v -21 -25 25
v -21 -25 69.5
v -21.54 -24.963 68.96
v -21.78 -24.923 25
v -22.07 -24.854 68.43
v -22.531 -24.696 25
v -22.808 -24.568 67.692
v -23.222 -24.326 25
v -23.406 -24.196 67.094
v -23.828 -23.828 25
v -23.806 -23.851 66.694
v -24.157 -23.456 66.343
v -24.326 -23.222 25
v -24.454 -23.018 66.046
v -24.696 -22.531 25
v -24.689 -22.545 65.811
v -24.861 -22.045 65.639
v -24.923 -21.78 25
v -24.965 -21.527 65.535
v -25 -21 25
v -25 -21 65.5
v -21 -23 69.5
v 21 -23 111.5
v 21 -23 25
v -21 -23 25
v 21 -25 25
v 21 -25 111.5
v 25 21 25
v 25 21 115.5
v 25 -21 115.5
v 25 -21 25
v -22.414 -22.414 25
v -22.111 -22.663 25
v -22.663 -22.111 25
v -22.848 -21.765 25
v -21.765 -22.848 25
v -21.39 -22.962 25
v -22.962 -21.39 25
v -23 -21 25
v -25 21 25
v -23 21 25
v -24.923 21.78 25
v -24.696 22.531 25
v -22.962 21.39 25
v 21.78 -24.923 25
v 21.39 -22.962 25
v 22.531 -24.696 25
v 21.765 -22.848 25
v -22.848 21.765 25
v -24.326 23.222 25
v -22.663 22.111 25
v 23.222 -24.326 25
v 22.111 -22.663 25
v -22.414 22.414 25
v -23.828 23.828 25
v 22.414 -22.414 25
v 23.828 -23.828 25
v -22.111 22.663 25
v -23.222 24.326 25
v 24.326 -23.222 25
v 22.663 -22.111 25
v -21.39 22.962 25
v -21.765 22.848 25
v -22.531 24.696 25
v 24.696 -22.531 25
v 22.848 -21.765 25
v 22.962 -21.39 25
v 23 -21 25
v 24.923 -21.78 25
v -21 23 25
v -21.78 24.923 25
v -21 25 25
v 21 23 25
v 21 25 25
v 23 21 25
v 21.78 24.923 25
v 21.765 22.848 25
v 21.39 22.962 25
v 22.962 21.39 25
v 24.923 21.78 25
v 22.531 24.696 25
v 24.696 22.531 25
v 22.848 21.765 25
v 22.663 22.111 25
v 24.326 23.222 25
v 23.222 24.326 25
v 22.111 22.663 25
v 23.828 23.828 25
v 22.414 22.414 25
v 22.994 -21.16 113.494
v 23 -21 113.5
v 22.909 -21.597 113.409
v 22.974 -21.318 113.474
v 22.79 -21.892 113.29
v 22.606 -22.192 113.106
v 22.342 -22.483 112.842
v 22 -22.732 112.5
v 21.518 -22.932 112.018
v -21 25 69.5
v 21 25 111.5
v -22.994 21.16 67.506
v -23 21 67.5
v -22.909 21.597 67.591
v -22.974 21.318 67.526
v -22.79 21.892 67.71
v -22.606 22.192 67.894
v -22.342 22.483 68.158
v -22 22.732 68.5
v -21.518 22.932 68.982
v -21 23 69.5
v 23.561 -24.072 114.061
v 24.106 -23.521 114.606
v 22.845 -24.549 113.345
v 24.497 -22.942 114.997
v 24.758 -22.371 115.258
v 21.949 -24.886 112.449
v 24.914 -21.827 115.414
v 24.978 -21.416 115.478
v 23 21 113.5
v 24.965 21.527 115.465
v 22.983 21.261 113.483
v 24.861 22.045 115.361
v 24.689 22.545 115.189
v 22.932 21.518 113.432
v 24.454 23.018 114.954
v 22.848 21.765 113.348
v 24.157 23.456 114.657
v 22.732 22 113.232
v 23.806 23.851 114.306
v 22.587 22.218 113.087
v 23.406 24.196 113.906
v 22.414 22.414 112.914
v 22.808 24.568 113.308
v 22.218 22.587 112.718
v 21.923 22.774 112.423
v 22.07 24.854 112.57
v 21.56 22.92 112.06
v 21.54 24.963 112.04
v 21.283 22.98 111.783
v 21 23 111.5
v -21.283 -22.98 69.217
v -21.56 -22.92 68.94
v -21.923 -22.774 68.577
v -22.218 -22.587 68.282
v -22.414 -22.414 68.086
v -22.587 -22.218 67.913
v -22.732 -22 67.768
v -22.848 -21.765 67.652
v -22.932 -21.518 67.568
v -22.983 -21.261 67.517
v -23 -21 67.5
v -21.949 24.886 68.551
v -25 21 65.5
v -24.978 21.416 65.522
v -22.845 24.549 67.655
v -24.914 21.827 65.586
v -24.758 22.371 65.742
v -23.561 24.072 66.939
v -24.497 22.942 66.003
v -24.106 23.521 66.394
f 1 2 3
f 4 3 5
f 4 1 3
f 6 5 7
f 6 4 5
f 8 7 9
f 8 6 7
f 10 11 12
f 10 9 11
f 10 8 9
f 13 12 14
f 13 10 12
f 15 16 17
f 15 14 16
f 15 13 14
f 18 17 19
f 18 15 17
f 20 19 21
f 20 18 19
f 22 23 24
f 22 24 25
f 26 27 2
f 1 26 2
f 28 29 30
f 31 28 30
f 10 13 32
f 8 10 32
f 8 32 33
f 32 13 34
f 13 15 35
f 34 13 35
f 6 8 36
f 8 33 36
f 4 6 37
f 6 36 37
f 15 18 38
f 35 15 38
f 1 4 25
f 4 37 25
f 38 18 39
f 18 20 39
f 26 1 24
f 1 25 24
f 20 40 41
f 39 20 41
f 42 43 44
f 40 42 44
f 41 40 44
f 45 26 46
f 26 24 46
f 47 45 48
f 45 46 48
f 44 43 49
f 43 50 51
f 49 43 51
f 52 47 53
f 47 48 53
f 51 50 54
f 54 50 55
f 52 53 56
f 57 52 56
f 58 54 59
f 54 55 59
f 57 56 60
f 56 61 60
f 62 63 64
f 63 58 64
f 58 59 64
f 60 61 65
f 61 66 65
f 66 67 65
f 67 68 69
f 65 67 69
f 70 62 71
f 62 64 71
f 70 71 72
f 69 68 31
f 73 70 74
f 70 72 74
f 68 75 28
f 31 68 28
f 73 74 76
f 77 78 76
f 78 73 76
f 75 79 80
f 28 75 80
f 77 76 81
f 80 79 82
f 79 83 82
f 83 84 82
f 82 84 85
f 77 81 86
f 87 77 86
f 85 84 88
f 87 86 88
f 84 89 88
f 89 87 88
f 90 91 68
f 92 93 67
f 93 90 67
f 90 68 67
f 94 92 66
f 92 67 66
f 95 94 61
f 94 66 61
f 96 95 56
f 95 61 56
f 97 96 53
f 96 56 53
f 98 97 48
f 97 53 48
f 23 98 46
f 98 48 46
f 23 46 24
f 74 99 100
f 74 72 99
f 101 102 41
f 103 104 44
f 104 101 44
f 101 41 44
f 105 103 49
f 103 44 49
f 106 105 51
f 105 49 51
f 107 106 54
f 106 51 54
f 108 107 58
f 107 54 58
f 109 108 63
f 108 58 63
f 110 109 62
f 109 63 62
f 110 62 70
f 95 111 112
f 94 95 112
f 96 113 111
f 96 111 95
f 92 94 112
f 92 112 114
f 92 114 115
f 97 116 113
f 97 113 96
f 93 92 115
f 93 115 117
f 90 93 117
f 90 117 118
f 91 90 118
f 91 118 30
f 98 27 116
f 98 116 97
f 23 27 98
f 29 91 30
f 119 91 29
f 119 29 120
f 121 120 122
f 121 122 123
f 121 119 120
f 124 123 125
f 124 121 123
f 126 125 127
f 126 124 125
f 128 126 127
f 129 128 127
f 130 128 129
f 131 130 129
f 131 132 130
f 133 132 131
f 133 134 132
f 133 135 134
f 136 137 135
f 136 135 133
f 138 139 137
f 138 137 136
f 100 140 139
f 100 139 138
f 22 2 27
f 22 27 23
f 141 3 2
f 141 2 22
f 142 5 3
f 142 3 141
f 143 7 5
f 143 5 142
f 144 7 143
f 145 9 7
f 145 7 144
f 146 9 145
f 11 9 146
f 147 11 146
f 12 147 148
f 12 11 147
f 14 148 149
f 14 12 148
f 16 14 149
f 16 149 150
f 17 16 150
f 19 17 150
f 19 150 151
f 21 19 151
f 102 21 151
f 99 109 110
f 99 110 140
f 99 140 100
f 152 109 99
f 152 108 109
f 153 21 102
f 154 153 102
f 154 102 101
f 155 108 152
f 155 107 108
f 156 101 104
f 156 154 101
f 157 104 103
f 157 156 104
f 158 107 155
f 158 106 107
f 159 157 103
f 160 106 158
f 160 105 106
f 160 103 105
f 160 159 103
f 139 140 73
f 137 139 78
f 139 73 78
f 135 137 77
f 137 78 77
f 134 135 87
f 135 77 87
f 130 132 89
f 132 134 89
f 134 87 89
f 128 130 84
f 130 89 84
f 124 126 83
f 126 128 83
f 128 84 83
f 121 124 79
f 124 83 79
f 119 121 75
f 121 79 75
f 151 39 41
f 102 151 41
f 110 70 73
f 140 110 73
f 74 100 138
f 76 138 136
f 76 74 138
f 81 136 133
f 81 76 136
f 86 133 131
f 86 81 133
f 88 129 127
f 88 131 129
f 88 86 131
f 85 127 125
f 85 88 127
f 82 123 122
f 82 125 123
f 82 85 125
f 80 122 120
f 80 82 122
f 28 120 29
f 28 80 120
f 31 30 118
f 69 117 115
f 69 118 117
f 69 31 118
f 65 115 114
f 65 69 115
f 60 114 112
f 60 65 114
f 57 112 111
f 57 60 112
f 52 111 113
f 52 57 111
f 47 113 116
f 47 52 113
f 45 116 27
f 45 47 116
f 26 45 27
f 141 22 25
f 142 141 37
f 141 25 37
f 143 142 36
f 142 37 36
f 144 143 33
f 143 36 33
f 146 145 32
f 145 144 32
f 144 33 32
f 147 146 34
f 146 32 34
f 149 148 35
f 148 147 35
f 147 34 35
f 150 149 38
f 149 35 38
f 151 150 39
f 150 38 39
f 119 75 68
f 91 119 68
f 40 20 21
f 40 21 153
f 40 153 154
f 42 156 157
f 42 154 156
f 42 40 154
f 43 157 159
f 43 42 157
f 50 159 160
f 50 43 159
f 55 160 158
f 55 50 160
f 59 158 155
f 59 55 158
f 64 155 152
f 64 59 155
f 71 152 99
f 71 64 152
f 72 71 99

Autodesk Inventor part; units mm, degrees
ref_plane "Start Plane" through (0, 0, 25) normal (0, 0, 1) x (1, 0, 0)
ref_plane "End Plane" through (0, 0, 115.5) normal (0, 0, 1) x (1, 0, 0)
sketch "Sketch" plane through (0, 0, 0) normal (0, 0, 1) x (1, 0, 0)
  line L0 (-25, -21) -> (-25, 21)
  line L1 (-21, 25) -> (21, 25)
  line L2 (25, 21) -> (25, -21)
  line L3 (21, -25) -> (-21, -25)
  arc A0 (-25, -21) -> (-21, -25) centre (-21, -21) ccw
  arc A1 (25, 21) -> (21, 25) centre (21, 21) ccw
  arc A2 (-21, 25) -> (-25, 21) centre (-21, 21) ccw
  arc A3 (21, -25) -> (25, -21) centre (21, -21) ccw
  arc A4 (-21, 23) -> (-23, 21) centre (-21, 21) ccw
  line L4 (-21, 23) -> (21, 23)
  arc A5 (23, 21) -> (21, 23) centre (21, 21) ccw
  line L5 (23, 21) -> (23, -21)
  arc A6 (21, -23) -> (23, -21) centre (21, -21) ccw
  line L6 (21, -23) -> (-21, -23)
  arc A7 (-23, -21) -> (-21, -23) centre (-21, -21) ccw
  line L7 (-23, -21) -> (-23, 21)
  line L8 (0, 36.1598) -> (0, -36.1598) construction
  line L9 (-36.1598, 0) -> (36.1598, 0) construction
  dimension "d7" = 4
  dimension "d9" = 50
  dimension "d11" = 50
  dimension "d12" = 2
  dimension "d15" = 25
  dimension "d16" = 25
extrude "Body" add sketch "Sketch" along normal up to surface (90.5 mm away) from surface at 25
sketch "Sketch3" plane through (0, 0, 0) normal (0, 0, 1) x (1, 0, 0)
  line L0 (0, 0) -> (10, 0)
ref_plane "Work Plane3" through (0, 0, 0) normal (0, -1, 0) x (1, 0, 0)
sketch "Sketch4" plane through (0, 0, 0) normal (0, -1, 0) x (1, 0, 0)
  line L0 (-2, 25) -> (12, 25)
  line L1 (-2, 115.5) -> (12, 115.5)
  dimension "d18" = 90.5
ref_plane "Work Plane4" through (25, 0, 115.5) normal (-0.7071, 0, 0.7071) x (0.7071, 0, 0.7071)
split "Split1" plane through (25, 0, 115.5) removes the side toward (-0.7071, 0, 0.7071)
ref_plane "Work Plane5" through (21, -282.75, 25) normal (0, 0, -1) x (-1, 0, 0)
split "Split2" plane through (21, -282.75, 25) removes the side toward (0, 0, -1)
equation "\"d7\" = G_IR"
equation "\"d9\" = G_W"
equation "\"d11\" = G_H"
equation "\"d12\" = G_T"
equation "\"d15\" = 0.5 * d9"
equation "\"d16\" = 0.5 * d11"
equation "\"d3\" = G_L"
equation "\"G_W\" = 50"
equation "\"G_H\" = 50"
equation "\"G_T\" = 2"
equation "\"G_IR\" = 4"
equation "\"G_L\" = d18"
equation "\"G_OFFSET_START\" = -25"
equation "\"G_OFFSET_END\" = 25"
equation "\"d13\" = -G_OFFSET_START"
equation "\"d14\" = G_OFFSET_END + B_L"
equation "\"B_L\" = 90.5"
properties part number "ISO 10799-2 - 50x50x2 - 90.5" material "Steel, Galvanized"
